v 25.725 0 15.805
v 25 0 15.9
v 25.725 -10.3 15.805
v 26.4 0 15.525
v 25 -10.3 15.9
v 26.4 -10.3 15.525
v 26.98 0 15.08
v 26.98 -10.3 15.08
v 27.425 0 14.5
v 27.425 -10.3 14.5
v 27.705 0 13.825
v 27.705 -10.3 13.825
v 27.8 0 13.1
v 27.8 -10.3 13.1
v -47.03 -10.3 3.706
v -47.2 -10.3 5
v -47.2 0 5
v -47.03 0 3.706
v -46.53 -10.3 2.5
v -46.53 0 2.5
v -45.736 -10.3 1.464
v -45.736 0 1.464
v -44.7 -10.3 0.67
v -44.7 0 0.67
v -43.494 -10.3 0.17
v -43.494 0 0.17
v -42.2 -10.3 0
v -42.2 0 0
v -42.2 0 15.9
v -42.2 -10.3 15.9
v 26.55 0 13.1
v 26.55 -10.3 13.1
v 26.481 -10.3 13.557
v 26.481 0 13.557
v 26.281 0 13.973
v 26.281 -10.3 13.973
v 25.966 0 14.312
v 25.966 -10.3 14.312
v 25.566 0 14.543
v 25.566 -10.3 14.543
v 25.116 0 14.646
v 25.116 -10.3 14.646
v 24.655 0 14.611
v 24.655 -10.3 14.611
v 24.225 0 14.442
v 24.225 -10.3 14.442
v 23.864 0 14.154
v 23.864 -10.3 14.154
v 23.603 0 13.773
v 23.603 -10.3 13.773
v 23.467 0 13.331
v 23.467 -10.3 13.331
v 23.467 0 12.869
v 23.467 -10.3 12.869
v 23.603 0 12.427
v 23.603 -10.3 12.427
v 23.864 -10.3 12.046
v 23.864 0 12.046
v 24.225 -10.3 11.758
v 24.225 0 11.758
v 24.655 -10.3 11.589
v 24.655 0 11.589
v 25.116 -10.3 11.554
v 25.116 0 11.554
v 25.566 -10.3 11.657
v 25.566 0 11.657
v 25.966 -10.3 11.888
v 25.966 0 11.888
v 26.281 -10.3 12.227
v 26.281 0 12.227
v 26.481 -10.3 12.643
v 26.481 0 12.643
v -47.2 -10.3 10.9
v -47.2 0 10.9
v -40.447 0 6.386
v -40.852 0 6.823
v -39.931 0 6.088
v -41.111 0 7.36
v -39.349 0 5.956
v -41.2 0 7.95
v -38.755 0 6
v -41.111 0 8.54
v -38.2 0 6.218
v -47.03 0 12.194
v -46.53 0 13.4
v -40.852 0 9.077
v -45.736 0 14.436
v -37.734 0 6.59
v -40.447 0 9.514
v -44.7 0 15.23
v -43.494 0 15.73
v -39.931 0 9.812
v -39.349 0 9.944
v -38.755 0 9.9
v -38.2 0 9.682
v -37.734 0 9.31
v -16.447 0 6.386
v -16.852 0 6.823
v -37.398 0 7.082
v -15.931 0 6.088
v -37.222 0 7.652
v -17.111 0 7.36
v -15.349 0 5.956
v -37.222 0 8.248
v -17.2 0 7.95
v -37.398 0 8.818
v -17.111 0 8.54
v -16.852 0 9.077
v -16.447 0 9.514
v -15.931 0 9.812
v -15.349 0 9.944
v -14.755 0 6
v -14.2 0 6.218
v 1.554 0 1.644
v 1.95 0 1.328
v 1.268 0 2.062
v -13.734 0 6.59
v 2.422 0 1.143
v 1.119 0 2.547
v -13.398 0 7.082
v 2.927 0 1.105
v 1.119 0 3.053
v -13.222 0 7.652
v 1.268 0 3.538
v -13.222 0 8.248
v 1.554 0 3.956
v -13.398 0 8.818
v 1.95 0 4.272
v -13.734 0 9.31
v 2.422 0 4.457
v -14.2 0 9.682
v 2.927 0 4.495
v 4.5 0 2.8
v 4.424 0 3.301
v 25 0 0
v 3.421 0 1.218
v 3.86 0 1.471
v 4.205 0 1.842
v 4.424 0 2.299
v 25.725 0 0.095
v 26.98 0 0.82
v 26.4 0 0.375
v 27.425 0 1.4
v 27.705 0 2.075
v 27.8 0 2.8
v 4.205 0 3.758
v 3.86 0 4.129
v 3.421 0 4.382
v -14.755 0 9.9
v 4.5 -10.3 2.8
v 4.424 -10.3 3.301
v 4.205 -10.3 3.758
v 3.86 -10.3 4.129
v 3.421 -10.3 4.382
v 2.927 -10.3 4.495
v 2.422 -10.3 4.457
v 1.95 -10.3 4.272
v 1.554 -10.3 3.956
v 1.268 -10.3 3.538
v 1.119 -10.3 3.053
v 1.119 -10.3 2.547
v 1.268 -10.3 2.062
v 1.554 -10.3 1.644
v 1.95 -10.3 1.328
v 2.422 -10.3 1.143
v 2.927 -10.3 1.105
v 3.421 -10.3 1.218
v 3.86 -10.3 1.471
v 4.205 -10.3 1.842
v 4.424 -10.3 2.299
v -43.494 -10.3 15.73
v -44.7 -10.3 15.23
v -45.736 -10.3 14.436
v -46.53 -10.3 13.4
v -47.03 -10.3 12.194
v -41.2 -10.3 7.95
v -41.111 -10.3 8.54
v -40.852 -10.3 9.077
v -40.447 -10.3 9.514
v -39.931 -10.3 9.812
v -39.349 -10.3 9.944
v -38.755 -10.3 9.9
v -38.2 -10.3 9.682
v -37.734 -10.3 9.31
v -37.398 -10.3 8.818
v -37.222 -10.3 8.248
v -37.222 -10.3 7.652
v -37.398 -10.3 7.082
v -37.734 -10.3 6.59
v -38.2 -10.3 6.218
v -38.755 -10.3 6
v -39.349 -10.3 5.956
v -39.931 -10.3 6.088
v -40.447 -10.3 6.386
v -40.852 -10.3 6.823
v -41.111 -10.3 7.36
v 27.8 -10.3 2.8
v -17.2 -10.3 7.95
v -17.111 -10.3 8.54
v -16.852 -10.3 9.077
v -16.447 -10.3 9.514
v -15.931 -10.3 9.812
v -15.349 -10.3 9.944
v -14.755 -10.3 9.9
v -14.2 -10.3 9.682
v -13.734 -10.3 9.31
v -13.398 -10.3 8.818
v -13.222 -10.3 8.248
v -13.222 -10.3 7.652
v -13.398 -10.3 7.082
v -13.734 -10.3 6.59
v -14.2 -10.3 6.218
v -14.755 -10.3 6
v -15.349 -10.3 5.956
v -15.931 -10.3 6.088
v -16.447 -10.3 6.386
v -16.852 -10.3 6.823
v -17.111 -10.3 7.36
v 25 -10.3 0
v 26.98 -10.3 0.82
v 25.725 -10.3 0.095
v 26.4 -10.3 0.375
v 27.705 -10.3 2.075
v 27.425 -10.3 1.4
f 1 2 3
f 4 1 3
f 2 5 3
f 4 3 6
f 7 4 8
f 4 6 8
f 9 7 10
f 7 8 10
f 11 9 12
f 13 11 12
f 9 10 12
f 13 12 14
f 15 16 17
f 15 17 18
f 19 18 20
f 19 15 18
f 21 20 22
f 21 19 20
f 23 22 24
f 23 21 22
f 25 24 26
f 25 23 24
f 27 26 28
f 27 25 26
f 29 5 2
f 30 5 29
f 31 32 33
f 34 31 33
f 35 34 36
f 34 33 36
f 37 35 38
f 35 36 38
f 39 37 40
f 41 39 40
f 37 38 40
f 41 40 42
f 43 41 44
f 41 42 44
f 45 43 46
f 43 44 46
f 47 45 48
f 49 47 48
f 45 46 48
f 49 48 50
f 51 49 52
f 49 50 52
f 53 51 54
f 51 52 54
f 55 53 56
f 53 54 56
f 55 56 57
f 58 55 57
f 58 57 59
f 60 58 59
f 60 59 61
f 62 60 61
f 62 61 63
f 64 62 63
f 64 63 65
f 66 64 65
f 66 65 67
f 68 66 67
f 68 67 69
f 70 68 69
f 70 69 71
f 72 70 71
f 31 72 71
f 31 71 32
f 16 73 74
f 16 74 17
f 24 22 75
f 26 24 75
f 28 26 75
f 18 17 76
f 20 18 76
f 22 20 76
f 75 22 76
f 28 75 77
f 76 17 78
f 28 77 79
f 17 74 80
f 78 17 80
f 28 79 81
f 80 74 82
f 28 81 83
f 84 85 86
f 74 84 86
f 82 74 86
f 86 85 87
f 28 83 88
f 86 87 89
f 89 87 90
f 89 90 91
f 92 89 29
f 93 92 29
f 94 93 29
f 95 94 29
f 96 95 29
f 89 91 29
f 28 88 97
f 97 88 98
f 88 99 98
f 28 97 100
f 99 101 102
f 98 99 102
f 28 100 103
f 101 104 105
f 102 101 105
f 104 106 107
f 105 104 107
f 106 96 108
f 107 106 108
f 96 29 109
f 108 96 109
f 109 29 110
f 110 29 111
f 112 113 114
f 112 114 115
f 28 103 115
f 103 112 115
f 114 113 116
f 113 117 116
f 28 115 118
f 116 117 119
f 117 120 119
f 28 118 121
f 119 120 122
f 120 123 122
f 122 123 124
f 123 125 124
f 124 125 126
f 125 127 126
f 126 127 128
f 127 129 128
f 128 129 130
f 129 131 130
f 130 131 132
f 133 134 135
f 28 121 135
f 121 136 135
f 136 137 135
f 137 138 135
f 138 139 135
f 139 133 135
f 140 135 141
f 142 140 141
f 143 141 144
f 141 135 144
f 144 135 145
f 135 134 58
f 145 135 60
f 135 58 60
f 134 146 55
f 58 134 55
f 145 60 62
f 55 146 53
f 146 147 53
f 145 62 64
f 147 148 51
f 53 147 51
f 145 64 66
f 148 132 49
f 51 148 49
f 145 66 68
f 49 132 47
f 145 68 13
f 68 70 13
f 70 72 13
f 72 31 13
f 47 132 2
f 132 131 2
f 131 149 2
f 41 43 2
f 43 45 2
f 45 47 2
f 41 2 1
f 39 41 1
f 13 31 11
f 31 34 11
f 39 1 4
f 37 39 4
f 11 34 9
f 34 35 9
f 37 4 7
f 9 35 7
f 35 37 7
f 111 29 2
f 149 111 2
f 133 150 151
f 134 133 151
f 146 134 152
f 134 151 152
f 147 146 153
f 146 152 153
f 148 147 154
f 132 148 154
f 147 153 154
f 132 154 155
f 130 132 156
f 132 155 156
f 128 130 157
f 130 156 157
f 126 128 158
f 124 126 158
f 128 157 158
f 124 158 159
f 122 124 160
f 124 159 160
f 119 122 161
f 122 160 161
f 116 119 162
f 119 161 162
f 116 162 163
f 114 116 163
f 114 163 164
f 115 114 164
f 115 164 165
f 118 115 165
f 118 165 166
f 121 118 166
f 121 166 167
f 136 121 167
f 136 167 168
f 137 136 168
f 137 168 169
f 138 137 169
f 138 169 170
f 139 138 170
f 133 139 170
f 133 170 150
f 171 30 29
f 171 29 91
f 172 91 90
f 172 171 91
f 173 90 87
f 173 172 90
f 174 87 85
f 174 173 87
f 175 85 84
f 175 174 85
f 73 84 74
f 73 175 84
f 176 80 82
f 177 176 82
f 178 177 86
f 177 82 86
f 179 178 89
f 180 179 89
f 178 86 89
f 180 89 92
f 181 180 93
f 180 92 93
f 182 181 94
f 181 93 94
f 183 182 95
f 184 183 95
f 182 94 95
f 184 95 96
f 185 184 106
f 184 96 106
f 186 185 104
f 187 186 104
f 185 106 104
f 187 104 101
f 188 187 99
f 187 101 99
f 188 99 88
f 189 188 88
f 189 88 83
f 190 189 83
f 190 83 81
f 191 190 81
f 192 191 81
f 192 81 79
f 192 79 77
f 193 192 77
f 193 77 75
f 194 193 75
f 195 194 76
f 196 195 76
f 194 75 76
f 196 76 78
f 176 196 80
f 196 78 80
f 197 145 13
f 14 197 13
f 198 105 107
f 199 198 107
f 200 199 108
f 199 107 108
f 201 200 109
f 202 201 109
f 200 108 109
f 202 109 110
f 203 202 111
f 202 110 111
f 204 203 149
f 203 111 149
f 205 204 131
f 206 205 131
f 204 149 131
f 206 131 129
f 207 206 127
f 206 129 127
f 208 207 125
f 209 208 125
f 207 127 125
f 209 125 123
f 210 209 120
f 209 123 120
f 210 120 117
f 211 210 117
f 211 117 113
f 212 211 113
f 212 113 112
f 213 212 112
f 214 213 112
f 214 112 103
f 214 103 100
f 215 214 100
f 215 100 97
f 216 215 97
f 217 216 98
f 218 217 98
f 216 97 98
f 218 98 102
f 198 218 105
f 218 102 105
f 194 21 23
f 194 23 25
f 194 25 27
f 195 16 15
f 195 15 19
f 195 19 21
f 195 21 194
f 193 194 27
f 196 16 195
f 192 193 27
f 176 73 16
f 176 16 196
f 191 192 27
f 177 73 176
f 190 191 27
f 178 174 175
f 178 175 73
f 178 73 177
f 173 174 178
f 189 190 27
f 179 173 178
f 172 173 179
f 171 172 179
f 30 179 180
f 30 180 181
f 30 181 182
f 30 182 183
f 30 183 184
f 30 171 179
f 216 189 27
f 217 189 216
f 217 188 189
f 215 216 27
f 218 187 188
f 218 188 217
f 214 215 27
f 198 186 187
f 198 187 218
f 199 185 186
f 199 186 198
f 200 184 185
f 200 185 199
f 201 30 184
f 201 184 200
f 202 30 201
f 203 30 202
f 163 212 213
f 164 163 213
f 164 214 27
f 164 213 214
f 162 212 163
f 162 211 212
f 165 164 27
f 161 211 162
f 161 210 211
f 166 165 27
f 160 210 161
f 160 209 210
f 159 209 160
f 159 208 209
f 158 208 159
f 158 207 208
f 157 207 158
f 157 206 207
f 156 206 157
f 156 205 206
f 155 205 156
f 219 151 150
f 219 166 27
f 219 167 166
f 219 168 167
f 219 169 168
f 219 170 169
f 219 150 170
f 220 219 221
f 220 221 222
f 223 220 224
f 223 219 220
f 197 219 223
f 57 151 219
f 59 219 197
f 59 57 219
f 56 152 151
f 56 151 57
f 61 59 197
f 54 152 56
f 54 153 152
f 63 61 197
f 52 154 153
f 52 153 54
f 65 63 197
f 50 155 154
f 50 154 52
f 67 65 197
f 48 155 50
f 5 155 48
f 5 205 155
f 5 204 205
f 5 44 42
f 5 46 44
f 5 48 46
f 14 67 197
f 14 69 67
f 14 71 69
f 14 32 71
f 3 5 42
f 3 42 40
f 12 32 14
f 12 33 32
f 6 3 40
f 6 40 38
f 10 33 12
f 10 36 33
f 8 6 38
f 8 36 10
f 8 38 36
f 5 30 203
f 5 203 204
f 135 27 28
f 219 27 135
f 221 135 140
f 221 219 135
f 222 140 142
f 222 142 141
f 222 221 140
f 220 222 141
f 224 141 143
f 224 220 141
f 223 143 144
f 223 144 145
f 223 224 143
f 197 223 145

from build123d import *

# Parameters (mm, degrees)
F0_W     = 27.8
F0_H     = 15.9
F1_DEPTH = 10.3
F2_R     = 1.7
F2_R_2   = 1.55
F3_DEPTH = 10.301
F4_R     = 2.8
F6_DEPTH = 10.3
F7_R     = 2
F8_DEPTH = 10.3


with BuildPart() as f1:
    # F0 (on Front) → F1 (new body)
    with BuildSketch(Plane.XZ):
        with Locations((13.9, 7.95)):
            Rectangle(F0_W, F0_H)
    extrude(amount=F1_DEPTH)

    # F2 (on face) → F3 (cut, through all)
    with BuildSketch(Plane.XZ.offset(10.3)):
        with Locations((2.8, 2.8)):
            Circle(F2_R)
        with Locations((25, 13.1)):
            Circle(F2_R_2)
    extrude(amount=-F3_DEPTH, mode=Mode.SUBTRACT)

    # F4
    f4_edges = [f1.edges().sort_by_distance(p)[0] for p in [
        (0, -5.15, 0),
        (0, -5.15, 15.9),
        (27.8, -5.15, 0),
        (27.8, -5.15, 15.9),
    ]]
    fillet(f4_edges, radius=F4_R)

    # F5 (on face) → F6 (join, through all)
    with BuildSketch(Plane.XZ.offset(10.3)):
        with BuildLine():
            ThreePointArc((0, 13.1), (0.820101, 15.079899), (2.8, 15.9))
            Line((2.8, 15.9), (-42.2, 15.9))
            ThreePointArc((-42.2, 15.9), (-45.735534, 14.435534), (-47.2, 10.9))
            Line((-47.2, 10.9), (-47.2, 5))
            ThreePointArc((-47.2, 5), (-45.735534, 1.464466), (-42.2, 0))
            Line((-42.2, 0), (2.8, 0))
            ThreePointArc((2.8, 0), (0.820101, 0.820101), (0, 2.8))
            Line((0, 2.8), (0, 13.1))
        make_face()
    extrude(amount=-F6_DEPTH)

    # F7 (on face) → F8 (cut, through all)
    with BuildSketch(Plane(origin=(0, 0, 0), x_dir=(-1, 0, 0), z_dir=(0, 1, 0))):
        with Locations((39.2, 7.95)):
            Circle(F7_R)
        with Locations((15.2, 7.95)):
            Circle(F7_R)
    extrude(amount=-F8_DEPTH, mode=Mode.SUBTRACT)


solid = f1.part
